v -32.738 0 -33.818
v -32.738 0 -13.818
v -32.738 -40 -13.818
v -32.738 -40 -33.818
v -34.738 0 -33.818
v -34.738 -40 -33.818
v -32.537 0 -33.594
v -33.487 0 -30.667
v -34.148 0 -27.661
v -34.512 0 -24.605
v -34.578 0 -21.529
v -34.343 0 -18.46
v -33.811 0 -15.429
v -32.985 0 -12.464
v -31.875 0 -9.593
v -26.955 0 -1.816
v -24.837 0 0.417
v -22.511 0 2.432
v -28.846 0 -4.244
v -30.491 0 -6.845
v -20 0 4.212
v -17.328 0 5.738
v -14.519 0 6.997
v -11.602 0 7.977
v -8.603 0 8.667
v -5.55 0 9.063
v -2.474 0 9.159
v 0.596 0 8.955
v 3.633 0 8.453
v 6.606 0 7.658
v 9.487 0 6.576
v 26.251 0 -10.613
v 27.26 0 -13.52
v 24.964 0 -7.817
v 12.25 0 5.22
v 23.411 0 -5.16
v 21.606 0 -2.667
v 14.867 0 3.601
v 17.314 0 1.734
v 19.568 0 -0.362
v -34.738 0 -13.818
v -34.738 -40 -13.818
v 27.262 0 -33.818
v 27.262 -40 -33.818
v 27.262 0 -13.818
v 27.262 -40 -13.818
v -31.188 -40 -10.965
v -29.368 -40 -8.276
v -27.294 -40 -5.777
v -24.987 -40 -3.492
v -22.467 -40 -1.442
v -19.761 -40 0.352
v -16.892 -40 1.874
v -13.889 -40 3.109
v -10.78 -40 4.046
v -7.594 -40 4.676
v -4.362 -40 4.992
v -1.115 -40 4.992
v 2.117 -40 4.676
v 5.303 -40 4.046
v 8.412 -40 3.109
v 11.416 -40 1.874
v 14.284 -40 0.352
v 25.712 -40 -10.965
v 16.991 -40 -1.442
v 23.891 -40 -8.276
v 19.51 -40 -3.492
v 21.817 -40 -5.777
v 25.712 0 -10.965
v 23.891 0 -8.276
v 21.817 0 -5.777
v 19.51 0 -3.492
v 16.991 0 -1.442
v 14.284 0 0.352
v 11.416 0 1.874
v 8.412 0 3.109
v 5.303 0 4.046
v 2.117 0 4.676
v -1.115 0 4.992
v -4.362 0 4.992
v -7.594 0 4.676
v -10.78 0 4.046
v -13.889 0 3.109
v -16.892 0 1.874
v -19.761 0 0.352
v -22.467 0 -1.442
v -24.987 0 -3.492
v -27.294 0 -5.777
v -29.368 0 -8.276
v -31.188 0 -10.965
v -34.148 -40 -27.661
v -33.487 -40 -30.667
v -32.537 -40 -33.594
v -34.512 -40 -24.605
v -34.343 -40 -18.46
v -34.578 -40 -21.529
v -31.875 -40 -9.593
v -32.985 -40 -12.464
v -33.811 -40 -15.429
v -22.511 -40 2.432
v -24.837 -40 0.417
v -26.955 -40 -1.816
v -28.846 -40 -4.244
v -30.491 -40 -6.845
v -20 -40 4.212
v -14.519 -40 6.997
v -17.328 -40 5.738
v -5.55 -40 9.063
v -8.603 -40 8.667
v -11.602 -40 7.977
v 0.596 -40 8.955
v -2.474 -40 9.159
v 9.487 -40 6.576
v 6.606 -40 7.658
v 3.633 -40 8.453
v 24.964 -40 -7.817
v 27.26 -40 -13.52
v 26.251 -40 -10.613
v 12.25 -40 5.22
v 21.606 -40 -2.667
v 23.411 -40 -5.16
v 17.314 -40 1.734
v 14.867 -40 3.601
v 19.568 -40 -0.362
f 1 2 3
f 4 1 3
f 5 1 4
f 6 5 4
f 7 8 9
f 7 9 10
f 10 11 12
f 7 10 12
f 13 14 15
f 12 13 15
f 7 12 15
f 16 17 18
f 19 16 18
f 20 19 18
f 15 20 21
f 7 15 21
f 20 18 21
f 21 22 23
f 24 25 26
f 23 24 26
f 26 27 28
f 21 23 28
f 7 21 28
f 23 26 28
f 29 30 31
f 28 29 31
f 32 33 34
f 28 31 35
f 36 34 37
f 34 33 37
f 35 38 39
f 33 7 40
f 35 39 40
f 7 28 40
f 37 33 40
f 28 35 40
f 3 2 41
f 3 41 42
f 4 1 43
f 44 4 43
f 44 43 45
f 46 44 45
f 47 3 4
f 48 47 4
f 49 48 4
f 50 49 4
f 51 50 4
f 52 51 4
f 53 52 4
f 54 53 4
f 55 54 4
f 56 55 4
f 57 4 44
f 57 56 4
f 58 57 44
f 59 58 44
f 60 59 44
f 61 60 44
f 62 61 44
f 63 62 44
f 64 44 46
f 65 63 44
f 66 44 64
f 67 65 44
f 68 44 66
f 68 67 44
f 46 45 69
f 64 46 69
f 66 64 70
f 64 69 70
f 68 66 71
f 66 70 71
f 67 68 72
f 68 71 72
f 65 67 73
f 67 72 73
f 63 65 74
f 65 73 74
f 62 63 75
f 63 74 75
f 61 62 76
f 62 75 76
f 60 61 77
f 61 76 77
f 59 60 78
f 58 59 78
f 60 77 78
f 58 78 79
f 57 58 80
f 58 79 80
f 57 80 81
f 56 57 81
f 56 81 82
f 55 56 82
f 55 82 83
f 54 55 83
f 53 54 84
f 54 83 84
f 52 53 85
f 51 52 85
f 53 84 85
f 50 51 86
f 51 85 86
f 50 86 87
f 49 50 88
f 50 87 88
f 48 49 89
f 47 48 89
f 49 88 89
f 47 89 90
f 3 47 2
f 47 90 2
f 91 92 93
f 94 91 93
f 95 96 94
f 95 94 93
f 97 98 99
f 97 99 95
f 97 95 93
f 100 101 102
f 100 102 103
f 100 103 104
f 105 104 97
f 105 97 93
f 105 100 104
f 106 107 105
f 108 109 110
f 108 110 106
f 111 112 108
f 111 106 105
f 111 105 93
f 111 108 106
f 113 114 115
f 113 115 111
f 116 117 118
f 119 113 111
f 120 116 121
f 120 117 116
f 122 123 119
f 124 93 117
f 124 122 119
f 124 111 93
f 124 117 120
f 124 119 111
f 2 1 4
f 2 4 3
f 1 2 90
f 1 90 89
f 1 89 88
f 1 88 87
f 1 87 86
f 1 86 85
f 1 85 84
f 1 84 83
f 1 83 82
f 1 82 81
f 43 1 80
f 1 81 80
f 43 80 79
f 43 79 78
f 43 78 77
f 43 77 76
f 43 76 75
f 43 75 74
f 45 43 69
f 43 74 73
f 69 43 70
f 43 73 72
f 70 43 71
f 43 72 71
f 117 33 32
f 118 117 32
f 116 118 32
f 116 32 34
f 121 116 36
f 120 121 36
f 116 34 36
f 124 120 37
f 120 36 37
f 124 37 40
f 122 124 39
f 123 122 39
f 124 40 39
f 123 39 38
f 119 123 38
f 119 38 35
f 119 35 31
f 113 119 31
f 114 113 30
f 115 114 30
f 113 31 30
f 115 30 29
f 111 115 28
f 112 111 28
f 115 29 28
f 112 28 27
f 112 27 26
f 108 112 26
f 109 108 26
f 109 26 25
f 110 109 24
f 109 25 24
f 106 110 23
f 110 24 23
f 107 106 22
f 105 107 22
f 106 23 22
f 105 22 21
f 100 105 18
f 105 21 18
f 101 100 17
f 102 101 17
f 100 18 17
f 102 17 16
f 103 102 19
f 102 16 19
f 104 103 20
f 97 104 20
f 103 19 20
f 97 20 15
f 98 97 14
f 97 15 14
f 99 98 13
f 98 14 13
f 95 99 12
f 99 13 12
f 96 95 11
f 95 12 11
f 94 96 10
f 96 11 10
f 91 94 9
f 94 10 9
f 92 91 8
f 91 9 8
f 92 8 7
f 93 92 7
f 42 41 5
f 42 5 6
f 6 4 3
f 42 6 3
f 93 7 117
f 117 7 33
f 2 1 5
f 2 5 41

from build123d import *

# Parameters (mm, degrees)
F0_W     = 60
F0_H     = 20
F1_DEPTH = 40
F3_DEPTH = 40
F4_W     = 40
F4_H     = 20
F5_DEPTH = 2


# Not quite as in the source:
# - a feature names something its author has since deleted; it is built from what else it names


with BuildPart() as f1:
    # F0 (on Front) → F1 (new body)
    with BuildSketch(Plane.XZ):
        with Locations((-2.7382690459, -23.8184666568)):
            Rectangle(F0_W, F0_H)
        with BuildLine():
            ThreePointArc((27.2617309541, -13.8184666568), (-2.7382690459, 5.032068405), (-32.7382690459, -13.8184666568))
            Line((-32.7382690459, -13.8184666568), (27.2617309541, -13.8184666568))
        make_face()
    extrude(amount=F1_DEPTH)


with BuildPart() as f3:
    # F2 (on Front) → F3 (new body)
    with BuildSketch(Plane.XZ):
        with BuildLine():
            Line((-32.5370542705, -33.5944630206), (27.2599291056, -13.5201252997))
            ThreePointArc((27.2599291056, -13.5201252997), (-13.0723634113, 7.5226758687), (-32.5370542705, -33.5944630206))
        make_face()
    extrude(amount=F3_DEPTH)


with BuildPart() as f5:
    # F4 (on face) → F5 (new body)
    with BuildSketch(Plane(origin=(-32.7382690459, 0, 0), x_dir=(0, -1, 0), z_dir=(-1, 0, 0))):
        with Locations((20, -23.8184666568)):
            Rectangle(F4_W, F4_H)
    extrude(amount=F5_DEPTH)


solid = Compound([f1.part, f3.part, f5.part])
